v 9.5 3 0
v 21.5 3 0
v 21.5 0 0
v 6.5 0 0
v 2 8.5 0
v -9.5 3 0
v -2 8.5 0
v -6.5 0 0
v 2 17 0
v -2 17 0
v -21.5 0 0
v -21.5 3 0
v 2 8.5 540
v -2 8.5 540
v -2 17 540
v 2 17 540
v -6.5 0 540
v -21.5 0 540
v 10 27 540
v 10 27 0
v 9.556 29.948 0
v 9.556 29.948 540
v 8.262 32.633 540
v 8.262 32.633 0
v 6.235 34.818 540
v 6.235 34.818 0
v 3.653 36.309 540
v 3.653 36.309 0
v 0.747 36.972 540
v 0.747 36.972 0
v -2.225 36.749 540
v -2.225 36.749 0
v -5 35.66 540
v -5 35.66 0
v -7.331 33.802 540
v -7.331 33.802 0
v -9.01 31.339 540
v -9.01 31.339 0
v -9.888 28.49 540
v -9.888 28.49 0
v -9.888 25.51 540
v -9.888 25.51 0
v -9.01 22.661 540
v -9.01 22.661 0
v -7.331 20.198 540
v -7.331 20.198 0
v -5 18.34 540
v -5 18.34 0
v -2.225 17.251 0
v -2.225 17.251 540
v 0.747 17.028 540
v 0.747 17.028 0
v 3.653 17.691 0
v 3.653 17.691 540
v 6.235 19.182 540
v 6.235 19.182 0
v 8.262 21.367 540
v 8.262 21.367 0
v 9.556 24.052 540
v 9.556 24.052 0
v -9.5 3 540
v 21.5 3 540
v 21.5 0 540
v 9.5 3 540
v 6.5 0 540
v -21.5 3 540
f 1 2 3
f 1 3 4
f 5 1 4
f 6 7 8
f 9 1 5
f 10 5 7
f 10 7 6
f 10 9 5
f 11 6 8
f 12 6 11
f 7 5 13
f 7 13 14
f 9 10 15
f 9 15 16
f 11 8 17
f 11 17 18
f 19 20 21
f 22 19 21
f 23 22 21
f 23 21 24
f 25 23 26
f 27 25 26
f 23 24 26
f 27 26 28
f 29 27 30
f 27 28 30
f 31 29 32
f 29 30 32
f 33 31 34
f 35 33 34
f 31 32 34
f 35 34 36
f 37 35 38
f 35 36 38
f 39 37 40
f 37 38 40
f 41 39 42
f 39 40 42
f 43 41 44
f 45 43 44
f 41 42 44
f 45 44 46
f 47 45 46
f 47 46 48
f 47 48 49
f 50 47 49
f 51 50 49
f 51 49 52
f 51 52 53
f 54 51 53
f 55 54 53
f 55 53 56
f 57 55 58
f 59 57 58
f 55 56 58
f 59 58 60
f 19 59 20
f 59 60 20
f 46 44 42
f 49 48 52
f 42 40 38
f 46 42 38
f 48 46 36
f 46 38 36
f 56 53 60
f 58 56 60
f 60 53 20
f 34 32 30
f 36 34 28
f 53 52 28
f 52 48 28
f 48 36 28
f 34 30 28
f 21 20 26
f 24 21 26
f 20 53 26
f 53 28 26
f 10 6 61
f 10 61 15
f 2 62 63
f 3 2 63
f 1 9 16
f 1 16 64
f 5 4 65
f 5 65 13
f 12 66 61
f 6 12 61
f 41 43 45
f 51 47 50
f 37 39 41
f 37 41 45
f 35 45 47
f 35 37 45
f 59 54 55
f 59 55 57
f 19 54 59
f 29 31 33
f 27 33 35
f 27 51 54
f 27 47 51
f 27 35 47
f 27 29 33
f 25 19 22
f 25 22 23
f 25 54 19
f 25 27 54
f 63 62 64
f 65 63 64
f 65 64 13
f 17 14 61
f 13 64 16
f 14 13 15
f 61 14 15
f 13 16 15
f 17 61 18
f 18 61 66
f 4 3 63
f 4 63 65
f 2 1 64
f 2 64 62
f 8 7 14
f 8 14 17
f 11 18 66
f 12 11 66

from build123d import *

# Parameters (mm, degrees)
CROQUIS1_R                = 10
SALIENTE_EXTRUIR1_DEPTH   = 540
SALIENTE_EXTRUIR1_2_DEPTH = 540


with BuildPart() as part:
    # Croquis1 → Saliente-Extruir1 (new body)
    with BuildSketch(Plane.XY):
        with Locations((0, 27)):
            Circle(CROQUIS1_R)
    extrude(amount=SALIENTE_EXTRUIR1_DEPTH)


with BuildPart() as body_2:
    # Croquis1 → Saliente-Extruir1 2 (new body)
    with BuildSketch(Plane.XY):
        Polygon((-6.5, 0), (-21.5, 0), (-21.5, 3), (-9.5, 3), (-2, 17), (2, 17), (9.5, 3), (21.5, 3), (21.5, 0), (6.5, 0), (2, 8.5), (-2, 8.5), align=None)
    extrude(amount=SALIENTE_EXTRUIR1_2_DEPTH)


solid = Compound([part.part, body_2.part])
